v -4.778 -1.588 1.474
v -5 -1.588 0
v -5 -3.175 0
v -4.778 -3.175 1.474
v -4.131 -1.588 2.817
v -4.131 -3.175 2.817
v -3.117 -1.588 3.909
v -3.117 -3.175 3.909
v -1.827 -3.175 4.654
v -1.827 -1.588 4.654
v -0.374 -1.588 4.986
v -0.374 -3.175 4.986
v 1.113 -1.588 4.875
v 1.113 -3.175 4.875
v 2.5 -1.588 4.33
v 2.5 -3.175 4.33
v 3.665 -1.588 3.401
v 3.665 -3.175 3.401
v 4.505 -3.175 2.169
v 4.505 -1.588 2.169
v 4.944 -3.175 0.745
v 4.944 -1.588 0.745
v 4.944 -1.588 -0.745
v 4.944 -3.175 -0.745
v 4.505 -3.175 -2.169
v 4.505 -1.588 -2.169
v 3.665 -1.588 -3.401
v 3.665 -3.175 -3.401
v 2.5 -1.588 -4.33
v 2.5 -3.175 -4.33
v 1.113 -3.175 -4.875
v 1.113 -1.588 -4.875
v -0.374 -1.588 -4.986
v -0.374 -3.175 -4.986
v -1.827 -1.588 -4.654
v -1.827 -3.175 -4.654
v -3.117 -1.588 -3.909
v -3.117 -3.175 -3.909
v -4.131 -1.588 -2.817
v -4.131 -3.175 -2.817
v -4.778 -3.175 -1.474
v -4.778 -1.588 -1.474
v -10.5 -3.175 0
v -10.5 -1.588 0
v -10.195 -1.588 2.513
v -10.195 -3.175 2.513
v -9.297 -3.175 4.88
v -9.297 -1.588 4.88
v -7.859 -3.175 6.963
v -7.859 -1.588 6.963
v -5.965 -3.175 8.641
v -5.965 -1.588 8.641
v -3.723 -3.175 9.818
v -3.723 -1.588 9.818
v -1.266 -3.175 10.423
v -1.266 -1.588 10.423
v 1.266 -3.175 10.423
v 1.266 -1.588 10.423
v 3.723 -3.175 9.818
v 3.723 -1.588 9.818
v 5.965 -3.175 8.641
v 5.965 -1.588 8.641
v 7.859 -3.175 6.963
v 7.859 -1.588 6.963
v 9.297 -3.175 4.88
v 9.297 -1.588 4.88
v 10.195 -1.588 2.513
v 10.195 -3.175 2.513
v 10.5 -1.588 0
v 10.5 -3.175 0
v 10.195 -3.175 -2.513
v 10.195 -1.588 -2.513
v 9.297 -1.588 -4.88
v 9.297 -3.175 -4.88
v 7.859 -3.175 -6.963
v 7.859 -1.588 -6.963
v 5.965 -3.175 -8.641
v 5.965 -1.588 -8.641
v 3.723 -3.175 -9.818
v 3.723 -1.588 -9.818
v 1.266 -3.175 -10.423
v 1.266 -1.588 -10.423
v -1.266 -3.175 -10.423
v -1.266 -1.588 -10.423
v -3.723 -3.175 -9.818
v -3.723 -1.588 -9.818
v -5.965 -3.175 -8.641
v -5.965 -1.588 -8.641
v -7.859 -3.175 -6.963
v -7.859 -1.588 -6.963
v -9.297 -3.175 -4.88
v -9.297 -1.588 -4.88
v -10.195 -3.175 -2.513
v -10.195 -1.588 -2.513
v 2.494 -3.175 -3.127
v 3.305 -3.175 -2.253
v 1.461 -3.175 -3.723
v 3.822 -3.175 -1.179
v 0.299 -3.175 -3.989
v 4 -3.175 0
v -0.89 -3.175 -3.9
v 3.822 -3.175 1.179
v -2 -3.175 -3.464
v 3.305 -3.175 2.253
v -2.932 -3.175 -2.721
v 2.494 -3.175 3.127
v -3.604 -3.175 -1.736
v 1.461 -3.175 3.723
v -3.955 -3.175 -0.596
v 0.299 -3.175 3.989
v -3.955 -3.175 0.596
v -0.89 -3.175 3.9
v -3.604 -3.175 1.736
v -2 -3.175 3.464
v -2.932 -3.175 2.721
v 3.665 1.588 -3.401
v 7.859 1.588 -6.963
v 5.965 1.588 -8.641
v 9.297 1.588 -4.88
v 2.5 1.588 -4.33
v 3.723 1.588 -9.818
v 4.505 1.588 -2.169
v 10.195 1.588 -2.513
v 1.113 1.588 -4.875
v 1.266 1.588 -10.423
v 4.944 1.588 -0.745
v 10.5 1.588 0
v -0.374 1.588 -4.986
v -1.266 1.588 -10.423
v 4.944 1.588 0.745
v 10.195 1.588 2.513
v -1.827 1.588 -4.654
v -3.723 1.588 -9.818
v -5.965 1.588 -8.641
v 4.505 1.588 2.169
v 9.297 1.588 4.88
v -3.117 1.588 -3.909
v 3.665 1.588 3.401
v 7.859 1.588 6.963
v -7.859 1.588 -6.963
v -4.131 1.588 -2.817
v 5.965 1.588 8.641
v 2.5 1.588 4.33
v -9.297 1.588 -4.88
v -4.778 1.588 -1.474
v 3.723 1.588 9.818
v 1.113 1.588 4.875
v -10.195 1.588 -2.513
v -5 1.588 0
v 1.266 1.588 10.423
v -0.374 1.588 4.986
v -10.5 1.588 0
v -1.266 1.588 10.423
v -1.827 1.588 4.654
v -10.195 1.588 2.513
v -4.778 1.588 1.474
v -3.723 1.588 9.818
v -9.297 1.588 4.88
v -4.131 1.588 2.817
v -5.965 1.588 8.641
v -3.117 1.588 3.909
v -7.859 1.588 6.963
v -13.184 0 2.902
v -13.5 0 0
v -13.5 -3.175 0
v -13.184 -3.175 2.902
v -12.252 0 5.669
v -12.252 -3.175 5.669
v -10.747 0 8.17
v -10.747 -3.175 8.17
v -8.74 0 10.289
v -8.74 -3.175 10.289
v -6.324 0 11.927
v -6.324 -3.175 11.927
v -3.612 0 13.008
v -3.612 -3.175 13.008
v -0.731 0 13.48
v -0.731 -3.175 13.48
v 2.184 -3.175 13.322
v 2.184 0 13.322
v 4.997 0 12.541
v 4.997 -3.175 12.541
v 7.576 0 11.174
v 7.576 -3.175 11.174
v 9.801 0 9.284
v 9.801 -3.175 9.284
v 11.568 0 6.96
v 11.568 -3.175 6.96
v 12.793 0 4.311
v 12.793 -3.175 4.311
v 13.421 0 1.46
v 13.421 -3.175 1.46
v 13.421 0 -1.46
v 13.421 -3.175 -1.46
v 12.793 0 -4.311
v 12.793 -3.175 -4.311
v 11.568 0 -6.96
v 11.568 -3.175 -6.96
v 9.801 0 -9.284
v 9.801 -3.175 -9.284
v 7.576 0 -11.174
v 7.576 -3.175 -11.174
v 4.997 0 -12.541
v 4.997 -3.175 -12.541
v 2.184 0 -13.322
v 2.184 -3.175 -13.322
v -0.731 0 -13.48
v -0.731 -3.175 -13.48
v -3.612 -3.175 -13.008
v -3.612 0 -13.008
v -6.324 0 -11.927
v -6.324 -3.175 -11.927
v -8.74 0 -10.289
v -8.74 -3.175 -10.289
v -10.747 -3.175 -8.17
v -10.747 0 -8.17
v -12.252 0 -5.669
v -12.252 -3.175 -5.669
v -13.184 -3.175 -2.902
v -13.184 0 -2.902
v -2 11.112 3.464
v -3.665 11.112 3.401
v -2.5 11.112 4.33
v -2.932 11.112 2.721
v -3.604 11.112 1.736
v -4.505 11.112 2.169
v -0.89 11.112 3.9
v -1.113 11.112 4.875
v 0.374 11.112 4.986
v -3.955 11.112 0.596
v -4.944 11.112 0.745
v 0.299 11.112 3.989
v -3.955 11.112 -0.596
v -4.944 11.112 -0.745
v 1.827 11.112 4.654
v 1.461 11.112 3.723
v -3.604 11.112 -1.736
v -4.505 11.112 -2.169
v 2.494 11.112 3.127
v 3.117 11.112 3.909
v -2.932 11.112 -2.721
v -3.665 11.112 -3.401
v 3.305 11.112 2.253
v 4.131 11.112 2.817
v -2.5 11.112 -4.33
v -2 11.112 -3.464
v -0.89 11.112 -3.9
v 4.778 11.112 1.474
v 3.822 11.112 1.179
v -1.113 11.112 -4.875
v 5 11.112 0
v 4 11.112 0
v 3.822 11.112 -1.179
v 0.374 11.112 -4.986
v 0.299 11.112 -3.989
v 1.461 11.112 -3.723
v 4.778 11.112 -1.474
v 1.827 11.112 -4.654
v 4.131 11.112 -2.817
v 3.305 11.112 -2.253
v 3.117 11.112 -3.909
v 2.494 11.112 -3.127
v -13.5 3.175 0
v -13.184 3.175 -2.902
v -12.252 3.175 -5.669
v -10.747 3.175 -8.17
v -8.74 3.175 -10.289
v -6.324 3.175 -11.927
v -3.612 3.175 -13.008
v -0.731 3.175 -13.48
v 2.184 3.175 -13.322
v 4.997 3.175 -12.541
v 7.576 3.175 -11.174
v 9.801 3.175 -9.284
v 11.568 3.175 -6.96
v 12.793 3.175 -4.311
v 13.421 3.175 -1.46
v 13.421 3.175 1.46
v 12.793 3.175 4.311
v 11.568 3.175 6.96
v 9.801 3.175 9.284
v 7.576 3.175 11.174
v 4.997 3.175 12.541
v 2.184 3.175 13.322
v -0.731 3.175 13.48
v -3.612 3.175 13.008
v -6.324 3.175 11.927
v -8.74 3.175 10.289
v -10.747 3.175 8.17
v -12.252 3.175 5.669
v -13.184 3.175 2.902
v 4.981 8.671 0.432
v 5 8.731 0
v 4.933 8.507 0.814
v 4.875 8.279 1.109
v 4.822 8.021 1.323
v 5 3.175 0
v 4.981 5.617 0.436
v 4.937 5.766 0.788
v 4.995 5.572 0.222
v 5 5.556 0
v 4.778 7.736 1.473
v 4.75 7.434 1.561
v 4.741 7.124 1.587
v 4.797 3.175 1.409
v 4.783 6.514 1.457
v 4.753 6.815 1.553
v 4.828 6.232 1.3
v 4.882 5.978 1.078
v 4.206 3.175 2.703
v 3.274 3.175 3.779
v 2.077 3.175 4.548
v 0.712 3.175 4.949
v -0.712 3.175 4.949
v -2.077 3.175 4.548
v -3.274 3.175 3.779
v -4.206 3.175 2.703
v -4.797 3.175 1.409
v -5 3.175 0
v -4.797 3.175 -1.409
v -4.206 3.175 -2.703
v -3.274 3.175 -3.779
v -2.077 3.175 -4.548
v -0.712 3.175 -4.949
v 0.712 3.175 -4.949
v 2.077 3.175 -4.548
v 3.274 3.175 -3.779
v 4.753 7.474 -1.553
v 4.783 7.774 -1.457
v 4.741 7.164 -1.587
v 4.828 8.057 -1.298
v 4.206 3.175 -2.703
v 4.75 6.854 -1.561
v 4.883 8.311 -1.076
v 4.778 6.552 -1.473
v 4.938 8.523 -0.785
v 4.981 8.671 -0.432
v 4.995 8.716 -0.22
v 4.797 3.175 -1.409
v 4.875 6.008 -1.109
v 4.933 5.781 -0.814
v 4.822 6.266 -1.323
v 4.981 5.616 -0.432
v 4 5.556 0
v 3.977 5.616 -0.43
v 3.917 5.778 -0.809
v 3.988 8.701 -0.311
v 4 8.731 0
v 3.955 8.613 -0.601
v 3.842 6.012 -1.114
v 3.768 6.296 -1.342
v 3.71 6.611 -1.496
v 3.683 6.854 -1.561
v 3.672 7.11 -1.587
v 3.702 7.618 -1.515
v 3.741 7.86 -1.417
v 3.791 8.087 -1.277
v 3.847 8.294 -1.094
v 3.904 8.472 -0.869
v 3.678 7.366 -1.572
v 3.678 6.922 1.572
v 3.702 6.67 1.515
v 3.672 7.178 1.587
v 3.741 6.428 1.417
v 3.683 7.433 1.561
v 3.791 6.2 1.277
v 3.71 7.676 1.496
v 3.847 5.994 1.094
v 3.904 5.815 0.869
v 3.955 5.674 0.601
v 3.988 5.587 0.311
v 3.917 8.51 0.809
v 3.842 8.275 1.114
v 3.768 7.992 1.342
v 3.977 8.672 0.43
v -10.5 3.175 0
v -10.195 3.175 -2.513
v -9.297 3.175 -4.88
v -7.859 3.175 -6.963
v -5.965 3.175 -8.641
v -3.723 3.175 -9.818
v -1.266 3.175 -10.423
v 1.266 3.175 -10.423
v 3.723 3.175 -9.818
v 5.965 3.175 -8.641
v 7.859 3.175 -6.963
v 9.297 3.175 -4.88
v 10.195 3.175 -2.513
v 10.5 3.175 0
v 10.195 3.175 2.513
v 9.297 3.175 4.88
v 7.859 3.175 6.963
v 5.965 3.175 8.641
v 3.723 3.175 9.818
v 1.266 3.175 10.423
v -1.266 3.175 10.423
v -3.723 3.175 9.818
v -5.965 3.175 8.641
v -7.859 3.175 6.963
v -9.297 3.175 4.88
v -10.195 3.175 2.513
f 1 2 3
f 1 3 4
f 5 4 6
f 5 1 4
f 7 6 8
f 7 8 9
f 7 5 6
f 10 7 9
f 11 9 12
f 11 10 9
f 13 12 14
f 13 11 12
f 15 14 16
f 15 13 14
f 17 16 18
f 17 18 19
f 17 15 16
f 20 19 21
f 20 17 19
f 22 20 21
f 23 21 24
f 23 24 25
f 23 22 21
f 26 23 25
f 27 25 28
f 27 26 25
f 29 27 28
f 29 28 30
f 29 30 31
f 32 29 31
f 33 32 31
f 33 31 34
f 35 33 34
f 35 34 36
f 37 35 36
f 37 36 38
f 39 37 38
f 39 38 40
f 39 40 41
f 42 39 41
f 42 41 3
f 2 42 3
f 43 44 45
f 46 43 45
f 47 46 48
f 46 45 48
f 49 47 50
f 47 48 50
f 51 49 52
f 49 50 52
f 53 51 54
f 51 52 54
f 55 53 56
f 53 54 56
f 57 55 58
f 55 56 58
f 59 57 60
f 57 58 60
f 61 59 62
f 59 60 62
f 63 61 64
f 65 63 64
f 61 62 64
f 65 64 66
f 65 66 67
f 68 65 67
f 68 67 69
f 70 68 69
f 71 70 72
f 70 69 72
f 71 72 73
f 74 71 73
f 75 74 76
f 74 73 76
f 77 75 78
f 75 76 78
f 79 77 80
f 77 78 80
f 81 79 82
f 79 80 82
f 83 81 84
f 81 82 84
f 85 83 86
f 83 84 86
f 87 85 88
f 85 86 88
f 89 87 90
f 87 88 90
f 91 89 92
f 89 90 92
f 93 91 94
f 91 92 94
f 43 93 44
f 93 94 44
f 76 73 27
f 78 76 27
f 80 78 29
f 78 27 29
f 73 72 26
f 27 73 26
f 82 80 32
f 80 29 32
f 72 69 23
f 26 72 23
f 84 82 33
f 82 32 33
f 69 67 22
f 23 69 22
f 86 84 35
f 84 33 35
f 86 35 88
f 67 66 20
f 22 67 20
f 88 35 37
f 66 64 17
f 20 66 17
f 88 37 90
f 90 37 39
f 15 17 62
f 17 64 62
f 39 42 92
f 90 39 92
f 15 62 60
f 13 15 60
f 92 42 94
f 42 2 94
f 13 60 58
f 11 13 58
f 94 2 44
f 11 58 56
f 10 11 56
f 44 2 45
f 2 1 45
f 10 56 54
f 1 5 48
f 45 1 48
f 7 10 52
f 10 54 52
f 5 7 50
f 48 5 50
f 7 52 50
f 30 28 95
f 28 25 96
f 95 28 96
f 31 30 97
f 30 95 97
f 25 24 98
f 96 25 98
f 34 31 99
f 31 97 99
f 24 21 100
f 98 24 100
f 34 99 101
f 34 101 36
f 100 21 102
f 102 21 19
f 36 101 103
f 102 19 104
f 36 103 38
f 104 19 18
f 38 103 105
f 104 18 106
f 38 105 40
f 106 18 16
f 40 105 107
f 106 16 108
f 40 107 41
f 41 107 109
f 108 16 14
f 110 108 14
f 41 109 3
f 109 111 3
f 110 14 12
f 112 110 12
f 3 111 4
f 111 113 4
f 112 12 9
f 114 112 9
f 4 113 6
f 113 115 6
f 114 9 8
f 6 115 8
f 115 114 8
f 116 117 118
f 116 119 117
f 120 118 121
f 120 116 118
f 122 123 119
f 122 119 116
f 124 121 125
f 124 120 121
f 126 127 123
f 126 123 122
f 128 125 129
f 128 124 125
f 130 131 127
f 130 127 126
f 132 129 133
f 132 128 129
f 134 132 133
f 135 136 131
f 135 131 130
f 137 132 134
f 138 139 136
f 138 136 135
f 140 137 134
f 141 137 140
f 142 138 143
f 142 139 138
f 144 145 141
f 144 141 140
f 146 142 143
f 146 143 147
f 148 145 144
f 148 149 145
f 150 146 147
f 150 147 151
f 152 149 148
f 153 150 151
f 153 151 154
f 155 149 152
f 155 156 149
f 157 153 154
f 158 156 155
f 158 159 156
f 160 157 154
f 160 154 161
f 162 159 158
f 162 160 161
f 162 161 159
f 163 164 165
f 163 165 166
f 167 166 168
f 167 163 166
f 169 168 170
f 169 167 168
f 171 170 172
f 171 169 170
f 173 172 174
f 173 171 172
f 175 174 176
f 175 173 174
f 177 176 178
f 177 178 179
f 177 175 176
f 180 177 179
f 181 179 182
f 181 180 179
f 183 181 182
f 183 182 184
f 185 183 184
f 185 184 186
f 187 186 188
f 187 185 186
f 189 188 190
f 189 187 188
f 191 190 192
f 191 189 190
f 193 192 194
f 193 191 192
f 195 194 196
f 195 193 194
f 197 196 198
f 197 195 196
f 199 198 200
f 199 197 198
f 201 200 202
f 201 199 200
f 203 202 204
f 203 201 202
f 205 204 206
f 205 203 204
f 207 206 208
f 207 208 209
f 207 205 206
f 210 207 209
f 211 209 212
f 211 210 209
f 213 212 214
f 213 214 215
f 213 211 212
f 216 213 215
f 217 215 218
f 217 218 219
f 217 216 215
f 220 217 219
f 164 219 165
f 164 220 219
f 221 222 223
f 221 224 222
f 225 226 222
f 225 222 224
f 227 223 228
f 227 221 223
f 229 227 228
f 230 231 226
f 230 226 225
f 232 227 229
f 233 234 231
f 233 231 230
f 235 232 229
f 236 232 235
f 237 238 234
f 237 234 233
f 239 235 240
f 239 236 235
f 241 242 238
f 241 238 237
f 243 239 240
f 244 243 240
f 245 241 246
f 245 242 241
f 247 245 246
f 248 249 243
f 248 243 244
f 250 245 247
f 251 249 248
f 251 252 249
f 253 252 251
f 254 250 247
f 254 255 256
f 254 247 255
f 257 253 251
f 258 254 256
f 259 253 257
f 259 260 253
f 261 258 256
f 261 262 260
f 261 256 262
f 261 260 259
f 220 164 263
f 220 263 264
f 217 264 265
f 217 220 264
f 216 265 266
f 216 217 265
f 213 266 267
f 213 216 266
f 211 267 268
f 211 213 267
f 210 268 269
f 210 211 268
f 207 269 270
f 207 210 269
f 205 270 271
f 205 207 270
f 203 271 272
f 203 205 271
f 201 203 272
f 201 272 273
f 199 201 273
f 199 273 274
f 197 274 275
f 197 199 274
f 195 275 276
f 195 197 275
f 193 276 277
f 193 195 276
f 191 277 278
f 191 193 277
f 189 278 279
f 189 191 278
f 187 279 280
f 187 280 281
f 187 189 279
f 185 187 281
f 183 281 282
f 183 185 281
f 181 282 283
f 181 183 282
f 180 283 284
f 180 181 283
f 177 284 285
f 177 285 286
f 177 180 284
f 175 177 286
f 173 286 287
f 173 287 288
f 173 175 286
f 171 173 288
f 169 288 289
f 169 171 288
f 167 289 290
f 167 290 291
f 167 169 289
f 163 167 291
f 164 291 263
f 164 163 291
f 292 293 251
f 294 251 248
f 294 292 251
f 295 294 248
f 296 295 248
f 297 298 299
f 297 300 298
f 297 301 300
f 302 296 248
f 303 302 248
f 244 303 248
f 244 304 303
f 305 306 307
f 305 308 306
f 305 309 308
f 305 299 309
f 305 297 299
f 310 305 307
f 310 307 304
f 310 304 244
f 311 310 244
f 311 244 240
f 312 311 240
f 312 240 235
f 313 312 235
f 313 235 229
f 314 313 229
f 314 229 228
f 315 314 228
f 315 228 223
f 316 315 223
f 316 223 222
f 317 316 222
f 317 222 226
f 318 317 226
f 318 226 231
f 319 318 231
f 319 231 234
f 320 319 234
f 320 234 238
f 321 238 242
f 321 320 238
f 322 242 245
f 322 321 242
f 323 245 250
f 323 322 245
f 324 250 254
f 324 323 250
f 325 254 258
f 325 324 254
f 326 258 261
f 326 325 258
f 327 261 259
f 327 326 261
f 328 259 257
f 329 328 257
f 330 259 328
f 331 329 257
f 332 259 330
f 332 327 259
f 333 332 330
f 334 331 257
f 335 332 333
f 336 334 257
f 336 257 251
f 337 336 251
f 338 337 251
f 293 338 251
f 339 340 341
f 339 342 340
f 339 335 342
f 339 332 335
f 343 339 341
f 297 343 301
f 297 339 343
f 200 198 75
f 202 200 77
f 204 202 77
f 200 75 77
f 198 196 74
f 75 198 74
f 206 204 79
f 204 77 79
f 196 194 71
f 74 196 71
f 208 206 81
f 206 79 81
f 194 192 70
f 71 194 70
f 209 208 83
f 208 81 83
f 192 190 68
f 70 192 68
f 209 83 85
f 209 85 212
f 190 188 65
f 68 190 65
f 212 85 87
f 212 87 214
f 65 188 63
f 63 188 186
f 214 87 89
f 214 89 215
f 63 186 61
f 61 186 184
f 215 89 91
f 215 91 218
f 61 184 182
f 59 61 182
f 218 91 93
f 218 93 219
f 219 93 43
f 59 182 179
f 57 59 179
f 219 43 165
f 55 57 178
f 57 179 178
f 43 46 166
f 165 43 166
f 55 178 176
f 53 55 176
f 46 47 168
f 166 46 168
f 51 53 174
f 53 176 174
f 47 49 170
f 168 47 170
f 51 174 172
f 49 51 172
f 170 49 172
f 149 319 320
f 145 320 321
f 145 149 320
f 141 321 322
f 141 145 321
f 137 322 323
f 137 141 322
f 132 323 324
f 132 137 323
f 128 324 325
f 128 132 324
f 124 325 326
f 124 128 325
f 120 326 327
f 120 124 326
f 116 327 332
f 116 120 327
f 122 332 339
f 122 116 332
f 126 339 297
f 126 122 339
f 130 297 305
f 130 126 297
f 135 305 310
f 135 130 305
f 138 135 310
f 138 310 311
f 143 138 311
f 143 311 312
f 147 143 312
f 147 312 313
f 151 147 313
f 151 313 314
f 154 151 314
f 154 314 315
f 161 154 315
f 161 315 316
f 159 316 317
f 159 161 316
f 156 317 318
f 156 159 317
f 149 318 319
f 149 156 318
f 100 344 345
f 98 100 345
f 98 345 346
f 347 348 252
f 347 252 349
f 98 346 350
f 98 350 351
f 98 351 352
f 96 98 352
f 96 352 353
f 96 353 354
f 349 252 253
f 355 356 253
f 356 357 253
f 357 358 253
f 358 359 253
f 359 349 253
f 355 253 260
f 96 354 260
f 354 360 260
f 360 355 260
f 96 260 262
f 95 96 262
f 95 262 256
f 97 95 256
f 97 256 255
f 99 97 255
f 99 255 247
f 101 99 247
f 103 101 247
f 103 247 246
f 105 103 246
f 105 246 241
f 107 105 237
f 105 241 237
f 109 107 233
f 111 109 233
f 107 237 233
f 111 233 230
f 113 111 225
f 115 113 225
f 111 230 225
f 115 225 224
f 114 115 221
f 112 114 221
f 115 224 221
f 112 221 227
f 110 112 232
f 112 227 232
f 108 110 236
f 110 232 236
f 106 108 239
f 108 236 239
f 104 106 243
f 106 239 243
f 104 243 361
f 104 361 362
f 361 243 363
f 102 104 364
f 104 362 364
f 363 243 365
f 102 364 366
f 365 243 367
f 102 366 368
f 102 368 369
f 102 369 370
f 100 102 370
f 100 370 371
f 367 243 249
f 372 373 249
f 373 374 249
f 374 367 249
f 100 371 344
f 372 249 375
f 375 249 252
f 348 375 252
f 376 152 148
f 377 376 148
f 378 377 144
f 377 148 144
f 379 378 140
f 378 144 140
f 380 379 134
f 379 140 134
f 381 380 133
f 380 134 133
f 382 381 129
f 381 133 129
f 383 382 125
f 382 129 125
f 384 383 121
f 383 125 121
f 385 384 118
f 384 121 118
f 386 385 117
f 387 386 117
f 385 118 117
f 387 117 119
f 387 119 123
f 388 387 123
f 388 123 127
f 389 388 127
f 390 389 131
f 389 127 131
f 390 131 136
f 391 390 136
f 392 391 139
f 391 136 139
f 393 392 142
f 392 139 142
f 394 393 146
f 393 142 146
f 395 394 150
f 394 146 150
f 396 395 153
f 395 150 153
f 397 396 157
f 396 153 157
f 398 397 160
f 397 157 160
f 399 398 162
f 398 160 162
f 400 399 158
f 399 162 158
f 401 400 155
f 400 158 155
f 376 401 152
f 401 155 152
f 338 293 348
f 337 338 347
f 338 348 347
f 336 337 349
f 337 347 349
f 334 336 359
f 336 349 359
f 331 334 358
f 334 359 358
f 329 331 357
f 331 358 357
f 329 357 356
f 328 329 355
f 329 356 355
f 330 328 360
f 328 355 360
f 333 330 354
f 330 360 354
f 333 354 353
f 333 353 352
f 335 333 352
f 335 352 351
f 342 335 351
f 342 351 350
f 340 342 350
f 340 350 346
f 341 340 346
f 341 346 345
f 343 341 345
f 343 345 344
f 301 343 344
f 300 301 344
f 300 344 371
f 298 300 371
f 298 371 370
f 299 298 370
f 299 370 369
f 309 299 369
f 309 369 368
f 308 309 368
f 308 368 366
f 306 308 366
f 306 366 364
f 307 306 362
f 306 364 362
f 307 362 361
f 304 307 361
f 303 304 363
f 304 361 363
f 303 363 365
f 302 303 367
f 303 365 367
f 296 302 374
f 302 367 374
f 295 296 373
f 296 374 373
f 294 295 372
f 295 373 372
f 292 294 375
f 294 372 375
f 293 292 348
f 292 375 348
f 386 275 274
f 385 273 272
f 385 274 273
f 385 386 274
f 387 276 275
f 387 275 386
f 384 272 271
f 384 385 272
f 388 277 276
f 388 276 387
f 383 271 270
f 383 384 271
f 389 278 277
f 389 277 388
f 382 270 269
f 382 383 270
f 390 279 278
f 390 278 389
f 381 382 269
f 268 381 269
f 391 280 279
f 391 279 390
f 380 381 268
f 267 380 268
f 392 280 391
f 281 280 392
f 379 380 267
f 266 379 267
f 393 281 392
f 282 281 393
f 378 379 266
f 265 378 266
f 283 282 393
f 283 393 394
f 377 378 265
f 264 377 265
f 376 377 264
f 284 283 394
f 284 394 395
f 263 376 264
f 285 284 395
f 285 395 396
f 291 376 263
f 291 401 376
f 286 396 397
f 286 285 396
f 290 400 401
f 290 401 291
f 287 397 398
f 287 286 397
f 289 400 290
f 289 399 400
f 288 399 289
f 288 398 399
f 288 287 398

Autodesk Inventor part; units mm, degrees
ref_plane "YZ Plane" through (0, 0, 0) normal (1, 0, 0) x (0, 1, 0)
ref_plane "XZ Plane" through (0, 0, 0) normal (0, 1, 0) x (-1, 0, 0)
ref_plane "XY Plane" through (0, 0, 0) normal (0, 0, 1) x (1, 0, 0)
sketch "Sketch1" plane through (0, 0, 0) normal (0, 1, 0) x (-1, 0, 0)
  circle A0 centre (0, 0) radius 5
  circle A1 centre (0, 0) radius 10.5
  circle A2 centre (0, 0) radius 13.5
  line L0 (0, -18.9) -> (0, 18.9) projected
  line L1 (-18.9, 0) -> (18.9, 0) projected
  dimension "d0" = 10
  dimension "d1" = 21
  dimension "d2" = 27
extrude "Extrusion1" add sketch "Sketch1" along normal mid plane 6.35 contours L1 A2 L0 A1 | A1 L0 A2 L1 | A1 L1 A2 L0 | L0 A2 L1 A1
extrude "Extrusion2" add sketch "Sketch1" along normal mid plane 3.175 contours L1 A1 L0 A0 | A0 L0 A1 L1 | A0 L1 A1 L0 | L0 A1 L1 A0
extrude "Extrusion3" add sketch "Sketch1" along normal mid plane 6.35 contours L1 L0 A0 | A0 L0 L1 | L0 L1 A0 | A0 L1 L0
sketch "Sketch2" plane through (0, 3.175, 0) normal (0, 1, 0) x (1, 0, 0)
  circle A0 centre (0, 0) radius 5 projected
extrude "Extrusion4" add sketch "Sketch2" along normal blind 7.9375
sketch "Sketch3" plane through (0, 11.1125, 0) normal (0, 1, 0) x (1, 0, 0)
  circle A0 centre (0, 0) radius 4
  dimension "d11" = 8
extrude "Extrusion5" cut sketch "Sketch3" against normal up to next
sketch "Sketch4" plane through (0, 0, 0) normal (1, 0, 0) x (0, 1, 0)
  circle A0 centre (7.1437, 0) radius 1.5875
  line L0 (11.1125, 4) -> (11.1125, -4) projected
  line L1 (3.175, 10.5) -> (3.175, -10.5) projected
  line L2 (3.175, -13.5) -> (3.175, 13.5) construction
  line L3 (3.175, -4) -> (11.1125, -4) construction
  line L4 (11.1125, -4) -> (-3.175, -4) construction
  line L5 (7.1437, -4) -> (7.1437, 4) construction
  line L6 (11.1125, 4) -> (-3.175, 4) construction
  line L7 (-6.0325, 0) -> (13.97, 0) construction
  point P0 (0, 0)
  dimension "d14" = 3.175
extrude "Extrusion6" cut sketch "Sketch4" along normal up to surface
properties part number "Spur Gear" material "Brass, Soft Yellow"
